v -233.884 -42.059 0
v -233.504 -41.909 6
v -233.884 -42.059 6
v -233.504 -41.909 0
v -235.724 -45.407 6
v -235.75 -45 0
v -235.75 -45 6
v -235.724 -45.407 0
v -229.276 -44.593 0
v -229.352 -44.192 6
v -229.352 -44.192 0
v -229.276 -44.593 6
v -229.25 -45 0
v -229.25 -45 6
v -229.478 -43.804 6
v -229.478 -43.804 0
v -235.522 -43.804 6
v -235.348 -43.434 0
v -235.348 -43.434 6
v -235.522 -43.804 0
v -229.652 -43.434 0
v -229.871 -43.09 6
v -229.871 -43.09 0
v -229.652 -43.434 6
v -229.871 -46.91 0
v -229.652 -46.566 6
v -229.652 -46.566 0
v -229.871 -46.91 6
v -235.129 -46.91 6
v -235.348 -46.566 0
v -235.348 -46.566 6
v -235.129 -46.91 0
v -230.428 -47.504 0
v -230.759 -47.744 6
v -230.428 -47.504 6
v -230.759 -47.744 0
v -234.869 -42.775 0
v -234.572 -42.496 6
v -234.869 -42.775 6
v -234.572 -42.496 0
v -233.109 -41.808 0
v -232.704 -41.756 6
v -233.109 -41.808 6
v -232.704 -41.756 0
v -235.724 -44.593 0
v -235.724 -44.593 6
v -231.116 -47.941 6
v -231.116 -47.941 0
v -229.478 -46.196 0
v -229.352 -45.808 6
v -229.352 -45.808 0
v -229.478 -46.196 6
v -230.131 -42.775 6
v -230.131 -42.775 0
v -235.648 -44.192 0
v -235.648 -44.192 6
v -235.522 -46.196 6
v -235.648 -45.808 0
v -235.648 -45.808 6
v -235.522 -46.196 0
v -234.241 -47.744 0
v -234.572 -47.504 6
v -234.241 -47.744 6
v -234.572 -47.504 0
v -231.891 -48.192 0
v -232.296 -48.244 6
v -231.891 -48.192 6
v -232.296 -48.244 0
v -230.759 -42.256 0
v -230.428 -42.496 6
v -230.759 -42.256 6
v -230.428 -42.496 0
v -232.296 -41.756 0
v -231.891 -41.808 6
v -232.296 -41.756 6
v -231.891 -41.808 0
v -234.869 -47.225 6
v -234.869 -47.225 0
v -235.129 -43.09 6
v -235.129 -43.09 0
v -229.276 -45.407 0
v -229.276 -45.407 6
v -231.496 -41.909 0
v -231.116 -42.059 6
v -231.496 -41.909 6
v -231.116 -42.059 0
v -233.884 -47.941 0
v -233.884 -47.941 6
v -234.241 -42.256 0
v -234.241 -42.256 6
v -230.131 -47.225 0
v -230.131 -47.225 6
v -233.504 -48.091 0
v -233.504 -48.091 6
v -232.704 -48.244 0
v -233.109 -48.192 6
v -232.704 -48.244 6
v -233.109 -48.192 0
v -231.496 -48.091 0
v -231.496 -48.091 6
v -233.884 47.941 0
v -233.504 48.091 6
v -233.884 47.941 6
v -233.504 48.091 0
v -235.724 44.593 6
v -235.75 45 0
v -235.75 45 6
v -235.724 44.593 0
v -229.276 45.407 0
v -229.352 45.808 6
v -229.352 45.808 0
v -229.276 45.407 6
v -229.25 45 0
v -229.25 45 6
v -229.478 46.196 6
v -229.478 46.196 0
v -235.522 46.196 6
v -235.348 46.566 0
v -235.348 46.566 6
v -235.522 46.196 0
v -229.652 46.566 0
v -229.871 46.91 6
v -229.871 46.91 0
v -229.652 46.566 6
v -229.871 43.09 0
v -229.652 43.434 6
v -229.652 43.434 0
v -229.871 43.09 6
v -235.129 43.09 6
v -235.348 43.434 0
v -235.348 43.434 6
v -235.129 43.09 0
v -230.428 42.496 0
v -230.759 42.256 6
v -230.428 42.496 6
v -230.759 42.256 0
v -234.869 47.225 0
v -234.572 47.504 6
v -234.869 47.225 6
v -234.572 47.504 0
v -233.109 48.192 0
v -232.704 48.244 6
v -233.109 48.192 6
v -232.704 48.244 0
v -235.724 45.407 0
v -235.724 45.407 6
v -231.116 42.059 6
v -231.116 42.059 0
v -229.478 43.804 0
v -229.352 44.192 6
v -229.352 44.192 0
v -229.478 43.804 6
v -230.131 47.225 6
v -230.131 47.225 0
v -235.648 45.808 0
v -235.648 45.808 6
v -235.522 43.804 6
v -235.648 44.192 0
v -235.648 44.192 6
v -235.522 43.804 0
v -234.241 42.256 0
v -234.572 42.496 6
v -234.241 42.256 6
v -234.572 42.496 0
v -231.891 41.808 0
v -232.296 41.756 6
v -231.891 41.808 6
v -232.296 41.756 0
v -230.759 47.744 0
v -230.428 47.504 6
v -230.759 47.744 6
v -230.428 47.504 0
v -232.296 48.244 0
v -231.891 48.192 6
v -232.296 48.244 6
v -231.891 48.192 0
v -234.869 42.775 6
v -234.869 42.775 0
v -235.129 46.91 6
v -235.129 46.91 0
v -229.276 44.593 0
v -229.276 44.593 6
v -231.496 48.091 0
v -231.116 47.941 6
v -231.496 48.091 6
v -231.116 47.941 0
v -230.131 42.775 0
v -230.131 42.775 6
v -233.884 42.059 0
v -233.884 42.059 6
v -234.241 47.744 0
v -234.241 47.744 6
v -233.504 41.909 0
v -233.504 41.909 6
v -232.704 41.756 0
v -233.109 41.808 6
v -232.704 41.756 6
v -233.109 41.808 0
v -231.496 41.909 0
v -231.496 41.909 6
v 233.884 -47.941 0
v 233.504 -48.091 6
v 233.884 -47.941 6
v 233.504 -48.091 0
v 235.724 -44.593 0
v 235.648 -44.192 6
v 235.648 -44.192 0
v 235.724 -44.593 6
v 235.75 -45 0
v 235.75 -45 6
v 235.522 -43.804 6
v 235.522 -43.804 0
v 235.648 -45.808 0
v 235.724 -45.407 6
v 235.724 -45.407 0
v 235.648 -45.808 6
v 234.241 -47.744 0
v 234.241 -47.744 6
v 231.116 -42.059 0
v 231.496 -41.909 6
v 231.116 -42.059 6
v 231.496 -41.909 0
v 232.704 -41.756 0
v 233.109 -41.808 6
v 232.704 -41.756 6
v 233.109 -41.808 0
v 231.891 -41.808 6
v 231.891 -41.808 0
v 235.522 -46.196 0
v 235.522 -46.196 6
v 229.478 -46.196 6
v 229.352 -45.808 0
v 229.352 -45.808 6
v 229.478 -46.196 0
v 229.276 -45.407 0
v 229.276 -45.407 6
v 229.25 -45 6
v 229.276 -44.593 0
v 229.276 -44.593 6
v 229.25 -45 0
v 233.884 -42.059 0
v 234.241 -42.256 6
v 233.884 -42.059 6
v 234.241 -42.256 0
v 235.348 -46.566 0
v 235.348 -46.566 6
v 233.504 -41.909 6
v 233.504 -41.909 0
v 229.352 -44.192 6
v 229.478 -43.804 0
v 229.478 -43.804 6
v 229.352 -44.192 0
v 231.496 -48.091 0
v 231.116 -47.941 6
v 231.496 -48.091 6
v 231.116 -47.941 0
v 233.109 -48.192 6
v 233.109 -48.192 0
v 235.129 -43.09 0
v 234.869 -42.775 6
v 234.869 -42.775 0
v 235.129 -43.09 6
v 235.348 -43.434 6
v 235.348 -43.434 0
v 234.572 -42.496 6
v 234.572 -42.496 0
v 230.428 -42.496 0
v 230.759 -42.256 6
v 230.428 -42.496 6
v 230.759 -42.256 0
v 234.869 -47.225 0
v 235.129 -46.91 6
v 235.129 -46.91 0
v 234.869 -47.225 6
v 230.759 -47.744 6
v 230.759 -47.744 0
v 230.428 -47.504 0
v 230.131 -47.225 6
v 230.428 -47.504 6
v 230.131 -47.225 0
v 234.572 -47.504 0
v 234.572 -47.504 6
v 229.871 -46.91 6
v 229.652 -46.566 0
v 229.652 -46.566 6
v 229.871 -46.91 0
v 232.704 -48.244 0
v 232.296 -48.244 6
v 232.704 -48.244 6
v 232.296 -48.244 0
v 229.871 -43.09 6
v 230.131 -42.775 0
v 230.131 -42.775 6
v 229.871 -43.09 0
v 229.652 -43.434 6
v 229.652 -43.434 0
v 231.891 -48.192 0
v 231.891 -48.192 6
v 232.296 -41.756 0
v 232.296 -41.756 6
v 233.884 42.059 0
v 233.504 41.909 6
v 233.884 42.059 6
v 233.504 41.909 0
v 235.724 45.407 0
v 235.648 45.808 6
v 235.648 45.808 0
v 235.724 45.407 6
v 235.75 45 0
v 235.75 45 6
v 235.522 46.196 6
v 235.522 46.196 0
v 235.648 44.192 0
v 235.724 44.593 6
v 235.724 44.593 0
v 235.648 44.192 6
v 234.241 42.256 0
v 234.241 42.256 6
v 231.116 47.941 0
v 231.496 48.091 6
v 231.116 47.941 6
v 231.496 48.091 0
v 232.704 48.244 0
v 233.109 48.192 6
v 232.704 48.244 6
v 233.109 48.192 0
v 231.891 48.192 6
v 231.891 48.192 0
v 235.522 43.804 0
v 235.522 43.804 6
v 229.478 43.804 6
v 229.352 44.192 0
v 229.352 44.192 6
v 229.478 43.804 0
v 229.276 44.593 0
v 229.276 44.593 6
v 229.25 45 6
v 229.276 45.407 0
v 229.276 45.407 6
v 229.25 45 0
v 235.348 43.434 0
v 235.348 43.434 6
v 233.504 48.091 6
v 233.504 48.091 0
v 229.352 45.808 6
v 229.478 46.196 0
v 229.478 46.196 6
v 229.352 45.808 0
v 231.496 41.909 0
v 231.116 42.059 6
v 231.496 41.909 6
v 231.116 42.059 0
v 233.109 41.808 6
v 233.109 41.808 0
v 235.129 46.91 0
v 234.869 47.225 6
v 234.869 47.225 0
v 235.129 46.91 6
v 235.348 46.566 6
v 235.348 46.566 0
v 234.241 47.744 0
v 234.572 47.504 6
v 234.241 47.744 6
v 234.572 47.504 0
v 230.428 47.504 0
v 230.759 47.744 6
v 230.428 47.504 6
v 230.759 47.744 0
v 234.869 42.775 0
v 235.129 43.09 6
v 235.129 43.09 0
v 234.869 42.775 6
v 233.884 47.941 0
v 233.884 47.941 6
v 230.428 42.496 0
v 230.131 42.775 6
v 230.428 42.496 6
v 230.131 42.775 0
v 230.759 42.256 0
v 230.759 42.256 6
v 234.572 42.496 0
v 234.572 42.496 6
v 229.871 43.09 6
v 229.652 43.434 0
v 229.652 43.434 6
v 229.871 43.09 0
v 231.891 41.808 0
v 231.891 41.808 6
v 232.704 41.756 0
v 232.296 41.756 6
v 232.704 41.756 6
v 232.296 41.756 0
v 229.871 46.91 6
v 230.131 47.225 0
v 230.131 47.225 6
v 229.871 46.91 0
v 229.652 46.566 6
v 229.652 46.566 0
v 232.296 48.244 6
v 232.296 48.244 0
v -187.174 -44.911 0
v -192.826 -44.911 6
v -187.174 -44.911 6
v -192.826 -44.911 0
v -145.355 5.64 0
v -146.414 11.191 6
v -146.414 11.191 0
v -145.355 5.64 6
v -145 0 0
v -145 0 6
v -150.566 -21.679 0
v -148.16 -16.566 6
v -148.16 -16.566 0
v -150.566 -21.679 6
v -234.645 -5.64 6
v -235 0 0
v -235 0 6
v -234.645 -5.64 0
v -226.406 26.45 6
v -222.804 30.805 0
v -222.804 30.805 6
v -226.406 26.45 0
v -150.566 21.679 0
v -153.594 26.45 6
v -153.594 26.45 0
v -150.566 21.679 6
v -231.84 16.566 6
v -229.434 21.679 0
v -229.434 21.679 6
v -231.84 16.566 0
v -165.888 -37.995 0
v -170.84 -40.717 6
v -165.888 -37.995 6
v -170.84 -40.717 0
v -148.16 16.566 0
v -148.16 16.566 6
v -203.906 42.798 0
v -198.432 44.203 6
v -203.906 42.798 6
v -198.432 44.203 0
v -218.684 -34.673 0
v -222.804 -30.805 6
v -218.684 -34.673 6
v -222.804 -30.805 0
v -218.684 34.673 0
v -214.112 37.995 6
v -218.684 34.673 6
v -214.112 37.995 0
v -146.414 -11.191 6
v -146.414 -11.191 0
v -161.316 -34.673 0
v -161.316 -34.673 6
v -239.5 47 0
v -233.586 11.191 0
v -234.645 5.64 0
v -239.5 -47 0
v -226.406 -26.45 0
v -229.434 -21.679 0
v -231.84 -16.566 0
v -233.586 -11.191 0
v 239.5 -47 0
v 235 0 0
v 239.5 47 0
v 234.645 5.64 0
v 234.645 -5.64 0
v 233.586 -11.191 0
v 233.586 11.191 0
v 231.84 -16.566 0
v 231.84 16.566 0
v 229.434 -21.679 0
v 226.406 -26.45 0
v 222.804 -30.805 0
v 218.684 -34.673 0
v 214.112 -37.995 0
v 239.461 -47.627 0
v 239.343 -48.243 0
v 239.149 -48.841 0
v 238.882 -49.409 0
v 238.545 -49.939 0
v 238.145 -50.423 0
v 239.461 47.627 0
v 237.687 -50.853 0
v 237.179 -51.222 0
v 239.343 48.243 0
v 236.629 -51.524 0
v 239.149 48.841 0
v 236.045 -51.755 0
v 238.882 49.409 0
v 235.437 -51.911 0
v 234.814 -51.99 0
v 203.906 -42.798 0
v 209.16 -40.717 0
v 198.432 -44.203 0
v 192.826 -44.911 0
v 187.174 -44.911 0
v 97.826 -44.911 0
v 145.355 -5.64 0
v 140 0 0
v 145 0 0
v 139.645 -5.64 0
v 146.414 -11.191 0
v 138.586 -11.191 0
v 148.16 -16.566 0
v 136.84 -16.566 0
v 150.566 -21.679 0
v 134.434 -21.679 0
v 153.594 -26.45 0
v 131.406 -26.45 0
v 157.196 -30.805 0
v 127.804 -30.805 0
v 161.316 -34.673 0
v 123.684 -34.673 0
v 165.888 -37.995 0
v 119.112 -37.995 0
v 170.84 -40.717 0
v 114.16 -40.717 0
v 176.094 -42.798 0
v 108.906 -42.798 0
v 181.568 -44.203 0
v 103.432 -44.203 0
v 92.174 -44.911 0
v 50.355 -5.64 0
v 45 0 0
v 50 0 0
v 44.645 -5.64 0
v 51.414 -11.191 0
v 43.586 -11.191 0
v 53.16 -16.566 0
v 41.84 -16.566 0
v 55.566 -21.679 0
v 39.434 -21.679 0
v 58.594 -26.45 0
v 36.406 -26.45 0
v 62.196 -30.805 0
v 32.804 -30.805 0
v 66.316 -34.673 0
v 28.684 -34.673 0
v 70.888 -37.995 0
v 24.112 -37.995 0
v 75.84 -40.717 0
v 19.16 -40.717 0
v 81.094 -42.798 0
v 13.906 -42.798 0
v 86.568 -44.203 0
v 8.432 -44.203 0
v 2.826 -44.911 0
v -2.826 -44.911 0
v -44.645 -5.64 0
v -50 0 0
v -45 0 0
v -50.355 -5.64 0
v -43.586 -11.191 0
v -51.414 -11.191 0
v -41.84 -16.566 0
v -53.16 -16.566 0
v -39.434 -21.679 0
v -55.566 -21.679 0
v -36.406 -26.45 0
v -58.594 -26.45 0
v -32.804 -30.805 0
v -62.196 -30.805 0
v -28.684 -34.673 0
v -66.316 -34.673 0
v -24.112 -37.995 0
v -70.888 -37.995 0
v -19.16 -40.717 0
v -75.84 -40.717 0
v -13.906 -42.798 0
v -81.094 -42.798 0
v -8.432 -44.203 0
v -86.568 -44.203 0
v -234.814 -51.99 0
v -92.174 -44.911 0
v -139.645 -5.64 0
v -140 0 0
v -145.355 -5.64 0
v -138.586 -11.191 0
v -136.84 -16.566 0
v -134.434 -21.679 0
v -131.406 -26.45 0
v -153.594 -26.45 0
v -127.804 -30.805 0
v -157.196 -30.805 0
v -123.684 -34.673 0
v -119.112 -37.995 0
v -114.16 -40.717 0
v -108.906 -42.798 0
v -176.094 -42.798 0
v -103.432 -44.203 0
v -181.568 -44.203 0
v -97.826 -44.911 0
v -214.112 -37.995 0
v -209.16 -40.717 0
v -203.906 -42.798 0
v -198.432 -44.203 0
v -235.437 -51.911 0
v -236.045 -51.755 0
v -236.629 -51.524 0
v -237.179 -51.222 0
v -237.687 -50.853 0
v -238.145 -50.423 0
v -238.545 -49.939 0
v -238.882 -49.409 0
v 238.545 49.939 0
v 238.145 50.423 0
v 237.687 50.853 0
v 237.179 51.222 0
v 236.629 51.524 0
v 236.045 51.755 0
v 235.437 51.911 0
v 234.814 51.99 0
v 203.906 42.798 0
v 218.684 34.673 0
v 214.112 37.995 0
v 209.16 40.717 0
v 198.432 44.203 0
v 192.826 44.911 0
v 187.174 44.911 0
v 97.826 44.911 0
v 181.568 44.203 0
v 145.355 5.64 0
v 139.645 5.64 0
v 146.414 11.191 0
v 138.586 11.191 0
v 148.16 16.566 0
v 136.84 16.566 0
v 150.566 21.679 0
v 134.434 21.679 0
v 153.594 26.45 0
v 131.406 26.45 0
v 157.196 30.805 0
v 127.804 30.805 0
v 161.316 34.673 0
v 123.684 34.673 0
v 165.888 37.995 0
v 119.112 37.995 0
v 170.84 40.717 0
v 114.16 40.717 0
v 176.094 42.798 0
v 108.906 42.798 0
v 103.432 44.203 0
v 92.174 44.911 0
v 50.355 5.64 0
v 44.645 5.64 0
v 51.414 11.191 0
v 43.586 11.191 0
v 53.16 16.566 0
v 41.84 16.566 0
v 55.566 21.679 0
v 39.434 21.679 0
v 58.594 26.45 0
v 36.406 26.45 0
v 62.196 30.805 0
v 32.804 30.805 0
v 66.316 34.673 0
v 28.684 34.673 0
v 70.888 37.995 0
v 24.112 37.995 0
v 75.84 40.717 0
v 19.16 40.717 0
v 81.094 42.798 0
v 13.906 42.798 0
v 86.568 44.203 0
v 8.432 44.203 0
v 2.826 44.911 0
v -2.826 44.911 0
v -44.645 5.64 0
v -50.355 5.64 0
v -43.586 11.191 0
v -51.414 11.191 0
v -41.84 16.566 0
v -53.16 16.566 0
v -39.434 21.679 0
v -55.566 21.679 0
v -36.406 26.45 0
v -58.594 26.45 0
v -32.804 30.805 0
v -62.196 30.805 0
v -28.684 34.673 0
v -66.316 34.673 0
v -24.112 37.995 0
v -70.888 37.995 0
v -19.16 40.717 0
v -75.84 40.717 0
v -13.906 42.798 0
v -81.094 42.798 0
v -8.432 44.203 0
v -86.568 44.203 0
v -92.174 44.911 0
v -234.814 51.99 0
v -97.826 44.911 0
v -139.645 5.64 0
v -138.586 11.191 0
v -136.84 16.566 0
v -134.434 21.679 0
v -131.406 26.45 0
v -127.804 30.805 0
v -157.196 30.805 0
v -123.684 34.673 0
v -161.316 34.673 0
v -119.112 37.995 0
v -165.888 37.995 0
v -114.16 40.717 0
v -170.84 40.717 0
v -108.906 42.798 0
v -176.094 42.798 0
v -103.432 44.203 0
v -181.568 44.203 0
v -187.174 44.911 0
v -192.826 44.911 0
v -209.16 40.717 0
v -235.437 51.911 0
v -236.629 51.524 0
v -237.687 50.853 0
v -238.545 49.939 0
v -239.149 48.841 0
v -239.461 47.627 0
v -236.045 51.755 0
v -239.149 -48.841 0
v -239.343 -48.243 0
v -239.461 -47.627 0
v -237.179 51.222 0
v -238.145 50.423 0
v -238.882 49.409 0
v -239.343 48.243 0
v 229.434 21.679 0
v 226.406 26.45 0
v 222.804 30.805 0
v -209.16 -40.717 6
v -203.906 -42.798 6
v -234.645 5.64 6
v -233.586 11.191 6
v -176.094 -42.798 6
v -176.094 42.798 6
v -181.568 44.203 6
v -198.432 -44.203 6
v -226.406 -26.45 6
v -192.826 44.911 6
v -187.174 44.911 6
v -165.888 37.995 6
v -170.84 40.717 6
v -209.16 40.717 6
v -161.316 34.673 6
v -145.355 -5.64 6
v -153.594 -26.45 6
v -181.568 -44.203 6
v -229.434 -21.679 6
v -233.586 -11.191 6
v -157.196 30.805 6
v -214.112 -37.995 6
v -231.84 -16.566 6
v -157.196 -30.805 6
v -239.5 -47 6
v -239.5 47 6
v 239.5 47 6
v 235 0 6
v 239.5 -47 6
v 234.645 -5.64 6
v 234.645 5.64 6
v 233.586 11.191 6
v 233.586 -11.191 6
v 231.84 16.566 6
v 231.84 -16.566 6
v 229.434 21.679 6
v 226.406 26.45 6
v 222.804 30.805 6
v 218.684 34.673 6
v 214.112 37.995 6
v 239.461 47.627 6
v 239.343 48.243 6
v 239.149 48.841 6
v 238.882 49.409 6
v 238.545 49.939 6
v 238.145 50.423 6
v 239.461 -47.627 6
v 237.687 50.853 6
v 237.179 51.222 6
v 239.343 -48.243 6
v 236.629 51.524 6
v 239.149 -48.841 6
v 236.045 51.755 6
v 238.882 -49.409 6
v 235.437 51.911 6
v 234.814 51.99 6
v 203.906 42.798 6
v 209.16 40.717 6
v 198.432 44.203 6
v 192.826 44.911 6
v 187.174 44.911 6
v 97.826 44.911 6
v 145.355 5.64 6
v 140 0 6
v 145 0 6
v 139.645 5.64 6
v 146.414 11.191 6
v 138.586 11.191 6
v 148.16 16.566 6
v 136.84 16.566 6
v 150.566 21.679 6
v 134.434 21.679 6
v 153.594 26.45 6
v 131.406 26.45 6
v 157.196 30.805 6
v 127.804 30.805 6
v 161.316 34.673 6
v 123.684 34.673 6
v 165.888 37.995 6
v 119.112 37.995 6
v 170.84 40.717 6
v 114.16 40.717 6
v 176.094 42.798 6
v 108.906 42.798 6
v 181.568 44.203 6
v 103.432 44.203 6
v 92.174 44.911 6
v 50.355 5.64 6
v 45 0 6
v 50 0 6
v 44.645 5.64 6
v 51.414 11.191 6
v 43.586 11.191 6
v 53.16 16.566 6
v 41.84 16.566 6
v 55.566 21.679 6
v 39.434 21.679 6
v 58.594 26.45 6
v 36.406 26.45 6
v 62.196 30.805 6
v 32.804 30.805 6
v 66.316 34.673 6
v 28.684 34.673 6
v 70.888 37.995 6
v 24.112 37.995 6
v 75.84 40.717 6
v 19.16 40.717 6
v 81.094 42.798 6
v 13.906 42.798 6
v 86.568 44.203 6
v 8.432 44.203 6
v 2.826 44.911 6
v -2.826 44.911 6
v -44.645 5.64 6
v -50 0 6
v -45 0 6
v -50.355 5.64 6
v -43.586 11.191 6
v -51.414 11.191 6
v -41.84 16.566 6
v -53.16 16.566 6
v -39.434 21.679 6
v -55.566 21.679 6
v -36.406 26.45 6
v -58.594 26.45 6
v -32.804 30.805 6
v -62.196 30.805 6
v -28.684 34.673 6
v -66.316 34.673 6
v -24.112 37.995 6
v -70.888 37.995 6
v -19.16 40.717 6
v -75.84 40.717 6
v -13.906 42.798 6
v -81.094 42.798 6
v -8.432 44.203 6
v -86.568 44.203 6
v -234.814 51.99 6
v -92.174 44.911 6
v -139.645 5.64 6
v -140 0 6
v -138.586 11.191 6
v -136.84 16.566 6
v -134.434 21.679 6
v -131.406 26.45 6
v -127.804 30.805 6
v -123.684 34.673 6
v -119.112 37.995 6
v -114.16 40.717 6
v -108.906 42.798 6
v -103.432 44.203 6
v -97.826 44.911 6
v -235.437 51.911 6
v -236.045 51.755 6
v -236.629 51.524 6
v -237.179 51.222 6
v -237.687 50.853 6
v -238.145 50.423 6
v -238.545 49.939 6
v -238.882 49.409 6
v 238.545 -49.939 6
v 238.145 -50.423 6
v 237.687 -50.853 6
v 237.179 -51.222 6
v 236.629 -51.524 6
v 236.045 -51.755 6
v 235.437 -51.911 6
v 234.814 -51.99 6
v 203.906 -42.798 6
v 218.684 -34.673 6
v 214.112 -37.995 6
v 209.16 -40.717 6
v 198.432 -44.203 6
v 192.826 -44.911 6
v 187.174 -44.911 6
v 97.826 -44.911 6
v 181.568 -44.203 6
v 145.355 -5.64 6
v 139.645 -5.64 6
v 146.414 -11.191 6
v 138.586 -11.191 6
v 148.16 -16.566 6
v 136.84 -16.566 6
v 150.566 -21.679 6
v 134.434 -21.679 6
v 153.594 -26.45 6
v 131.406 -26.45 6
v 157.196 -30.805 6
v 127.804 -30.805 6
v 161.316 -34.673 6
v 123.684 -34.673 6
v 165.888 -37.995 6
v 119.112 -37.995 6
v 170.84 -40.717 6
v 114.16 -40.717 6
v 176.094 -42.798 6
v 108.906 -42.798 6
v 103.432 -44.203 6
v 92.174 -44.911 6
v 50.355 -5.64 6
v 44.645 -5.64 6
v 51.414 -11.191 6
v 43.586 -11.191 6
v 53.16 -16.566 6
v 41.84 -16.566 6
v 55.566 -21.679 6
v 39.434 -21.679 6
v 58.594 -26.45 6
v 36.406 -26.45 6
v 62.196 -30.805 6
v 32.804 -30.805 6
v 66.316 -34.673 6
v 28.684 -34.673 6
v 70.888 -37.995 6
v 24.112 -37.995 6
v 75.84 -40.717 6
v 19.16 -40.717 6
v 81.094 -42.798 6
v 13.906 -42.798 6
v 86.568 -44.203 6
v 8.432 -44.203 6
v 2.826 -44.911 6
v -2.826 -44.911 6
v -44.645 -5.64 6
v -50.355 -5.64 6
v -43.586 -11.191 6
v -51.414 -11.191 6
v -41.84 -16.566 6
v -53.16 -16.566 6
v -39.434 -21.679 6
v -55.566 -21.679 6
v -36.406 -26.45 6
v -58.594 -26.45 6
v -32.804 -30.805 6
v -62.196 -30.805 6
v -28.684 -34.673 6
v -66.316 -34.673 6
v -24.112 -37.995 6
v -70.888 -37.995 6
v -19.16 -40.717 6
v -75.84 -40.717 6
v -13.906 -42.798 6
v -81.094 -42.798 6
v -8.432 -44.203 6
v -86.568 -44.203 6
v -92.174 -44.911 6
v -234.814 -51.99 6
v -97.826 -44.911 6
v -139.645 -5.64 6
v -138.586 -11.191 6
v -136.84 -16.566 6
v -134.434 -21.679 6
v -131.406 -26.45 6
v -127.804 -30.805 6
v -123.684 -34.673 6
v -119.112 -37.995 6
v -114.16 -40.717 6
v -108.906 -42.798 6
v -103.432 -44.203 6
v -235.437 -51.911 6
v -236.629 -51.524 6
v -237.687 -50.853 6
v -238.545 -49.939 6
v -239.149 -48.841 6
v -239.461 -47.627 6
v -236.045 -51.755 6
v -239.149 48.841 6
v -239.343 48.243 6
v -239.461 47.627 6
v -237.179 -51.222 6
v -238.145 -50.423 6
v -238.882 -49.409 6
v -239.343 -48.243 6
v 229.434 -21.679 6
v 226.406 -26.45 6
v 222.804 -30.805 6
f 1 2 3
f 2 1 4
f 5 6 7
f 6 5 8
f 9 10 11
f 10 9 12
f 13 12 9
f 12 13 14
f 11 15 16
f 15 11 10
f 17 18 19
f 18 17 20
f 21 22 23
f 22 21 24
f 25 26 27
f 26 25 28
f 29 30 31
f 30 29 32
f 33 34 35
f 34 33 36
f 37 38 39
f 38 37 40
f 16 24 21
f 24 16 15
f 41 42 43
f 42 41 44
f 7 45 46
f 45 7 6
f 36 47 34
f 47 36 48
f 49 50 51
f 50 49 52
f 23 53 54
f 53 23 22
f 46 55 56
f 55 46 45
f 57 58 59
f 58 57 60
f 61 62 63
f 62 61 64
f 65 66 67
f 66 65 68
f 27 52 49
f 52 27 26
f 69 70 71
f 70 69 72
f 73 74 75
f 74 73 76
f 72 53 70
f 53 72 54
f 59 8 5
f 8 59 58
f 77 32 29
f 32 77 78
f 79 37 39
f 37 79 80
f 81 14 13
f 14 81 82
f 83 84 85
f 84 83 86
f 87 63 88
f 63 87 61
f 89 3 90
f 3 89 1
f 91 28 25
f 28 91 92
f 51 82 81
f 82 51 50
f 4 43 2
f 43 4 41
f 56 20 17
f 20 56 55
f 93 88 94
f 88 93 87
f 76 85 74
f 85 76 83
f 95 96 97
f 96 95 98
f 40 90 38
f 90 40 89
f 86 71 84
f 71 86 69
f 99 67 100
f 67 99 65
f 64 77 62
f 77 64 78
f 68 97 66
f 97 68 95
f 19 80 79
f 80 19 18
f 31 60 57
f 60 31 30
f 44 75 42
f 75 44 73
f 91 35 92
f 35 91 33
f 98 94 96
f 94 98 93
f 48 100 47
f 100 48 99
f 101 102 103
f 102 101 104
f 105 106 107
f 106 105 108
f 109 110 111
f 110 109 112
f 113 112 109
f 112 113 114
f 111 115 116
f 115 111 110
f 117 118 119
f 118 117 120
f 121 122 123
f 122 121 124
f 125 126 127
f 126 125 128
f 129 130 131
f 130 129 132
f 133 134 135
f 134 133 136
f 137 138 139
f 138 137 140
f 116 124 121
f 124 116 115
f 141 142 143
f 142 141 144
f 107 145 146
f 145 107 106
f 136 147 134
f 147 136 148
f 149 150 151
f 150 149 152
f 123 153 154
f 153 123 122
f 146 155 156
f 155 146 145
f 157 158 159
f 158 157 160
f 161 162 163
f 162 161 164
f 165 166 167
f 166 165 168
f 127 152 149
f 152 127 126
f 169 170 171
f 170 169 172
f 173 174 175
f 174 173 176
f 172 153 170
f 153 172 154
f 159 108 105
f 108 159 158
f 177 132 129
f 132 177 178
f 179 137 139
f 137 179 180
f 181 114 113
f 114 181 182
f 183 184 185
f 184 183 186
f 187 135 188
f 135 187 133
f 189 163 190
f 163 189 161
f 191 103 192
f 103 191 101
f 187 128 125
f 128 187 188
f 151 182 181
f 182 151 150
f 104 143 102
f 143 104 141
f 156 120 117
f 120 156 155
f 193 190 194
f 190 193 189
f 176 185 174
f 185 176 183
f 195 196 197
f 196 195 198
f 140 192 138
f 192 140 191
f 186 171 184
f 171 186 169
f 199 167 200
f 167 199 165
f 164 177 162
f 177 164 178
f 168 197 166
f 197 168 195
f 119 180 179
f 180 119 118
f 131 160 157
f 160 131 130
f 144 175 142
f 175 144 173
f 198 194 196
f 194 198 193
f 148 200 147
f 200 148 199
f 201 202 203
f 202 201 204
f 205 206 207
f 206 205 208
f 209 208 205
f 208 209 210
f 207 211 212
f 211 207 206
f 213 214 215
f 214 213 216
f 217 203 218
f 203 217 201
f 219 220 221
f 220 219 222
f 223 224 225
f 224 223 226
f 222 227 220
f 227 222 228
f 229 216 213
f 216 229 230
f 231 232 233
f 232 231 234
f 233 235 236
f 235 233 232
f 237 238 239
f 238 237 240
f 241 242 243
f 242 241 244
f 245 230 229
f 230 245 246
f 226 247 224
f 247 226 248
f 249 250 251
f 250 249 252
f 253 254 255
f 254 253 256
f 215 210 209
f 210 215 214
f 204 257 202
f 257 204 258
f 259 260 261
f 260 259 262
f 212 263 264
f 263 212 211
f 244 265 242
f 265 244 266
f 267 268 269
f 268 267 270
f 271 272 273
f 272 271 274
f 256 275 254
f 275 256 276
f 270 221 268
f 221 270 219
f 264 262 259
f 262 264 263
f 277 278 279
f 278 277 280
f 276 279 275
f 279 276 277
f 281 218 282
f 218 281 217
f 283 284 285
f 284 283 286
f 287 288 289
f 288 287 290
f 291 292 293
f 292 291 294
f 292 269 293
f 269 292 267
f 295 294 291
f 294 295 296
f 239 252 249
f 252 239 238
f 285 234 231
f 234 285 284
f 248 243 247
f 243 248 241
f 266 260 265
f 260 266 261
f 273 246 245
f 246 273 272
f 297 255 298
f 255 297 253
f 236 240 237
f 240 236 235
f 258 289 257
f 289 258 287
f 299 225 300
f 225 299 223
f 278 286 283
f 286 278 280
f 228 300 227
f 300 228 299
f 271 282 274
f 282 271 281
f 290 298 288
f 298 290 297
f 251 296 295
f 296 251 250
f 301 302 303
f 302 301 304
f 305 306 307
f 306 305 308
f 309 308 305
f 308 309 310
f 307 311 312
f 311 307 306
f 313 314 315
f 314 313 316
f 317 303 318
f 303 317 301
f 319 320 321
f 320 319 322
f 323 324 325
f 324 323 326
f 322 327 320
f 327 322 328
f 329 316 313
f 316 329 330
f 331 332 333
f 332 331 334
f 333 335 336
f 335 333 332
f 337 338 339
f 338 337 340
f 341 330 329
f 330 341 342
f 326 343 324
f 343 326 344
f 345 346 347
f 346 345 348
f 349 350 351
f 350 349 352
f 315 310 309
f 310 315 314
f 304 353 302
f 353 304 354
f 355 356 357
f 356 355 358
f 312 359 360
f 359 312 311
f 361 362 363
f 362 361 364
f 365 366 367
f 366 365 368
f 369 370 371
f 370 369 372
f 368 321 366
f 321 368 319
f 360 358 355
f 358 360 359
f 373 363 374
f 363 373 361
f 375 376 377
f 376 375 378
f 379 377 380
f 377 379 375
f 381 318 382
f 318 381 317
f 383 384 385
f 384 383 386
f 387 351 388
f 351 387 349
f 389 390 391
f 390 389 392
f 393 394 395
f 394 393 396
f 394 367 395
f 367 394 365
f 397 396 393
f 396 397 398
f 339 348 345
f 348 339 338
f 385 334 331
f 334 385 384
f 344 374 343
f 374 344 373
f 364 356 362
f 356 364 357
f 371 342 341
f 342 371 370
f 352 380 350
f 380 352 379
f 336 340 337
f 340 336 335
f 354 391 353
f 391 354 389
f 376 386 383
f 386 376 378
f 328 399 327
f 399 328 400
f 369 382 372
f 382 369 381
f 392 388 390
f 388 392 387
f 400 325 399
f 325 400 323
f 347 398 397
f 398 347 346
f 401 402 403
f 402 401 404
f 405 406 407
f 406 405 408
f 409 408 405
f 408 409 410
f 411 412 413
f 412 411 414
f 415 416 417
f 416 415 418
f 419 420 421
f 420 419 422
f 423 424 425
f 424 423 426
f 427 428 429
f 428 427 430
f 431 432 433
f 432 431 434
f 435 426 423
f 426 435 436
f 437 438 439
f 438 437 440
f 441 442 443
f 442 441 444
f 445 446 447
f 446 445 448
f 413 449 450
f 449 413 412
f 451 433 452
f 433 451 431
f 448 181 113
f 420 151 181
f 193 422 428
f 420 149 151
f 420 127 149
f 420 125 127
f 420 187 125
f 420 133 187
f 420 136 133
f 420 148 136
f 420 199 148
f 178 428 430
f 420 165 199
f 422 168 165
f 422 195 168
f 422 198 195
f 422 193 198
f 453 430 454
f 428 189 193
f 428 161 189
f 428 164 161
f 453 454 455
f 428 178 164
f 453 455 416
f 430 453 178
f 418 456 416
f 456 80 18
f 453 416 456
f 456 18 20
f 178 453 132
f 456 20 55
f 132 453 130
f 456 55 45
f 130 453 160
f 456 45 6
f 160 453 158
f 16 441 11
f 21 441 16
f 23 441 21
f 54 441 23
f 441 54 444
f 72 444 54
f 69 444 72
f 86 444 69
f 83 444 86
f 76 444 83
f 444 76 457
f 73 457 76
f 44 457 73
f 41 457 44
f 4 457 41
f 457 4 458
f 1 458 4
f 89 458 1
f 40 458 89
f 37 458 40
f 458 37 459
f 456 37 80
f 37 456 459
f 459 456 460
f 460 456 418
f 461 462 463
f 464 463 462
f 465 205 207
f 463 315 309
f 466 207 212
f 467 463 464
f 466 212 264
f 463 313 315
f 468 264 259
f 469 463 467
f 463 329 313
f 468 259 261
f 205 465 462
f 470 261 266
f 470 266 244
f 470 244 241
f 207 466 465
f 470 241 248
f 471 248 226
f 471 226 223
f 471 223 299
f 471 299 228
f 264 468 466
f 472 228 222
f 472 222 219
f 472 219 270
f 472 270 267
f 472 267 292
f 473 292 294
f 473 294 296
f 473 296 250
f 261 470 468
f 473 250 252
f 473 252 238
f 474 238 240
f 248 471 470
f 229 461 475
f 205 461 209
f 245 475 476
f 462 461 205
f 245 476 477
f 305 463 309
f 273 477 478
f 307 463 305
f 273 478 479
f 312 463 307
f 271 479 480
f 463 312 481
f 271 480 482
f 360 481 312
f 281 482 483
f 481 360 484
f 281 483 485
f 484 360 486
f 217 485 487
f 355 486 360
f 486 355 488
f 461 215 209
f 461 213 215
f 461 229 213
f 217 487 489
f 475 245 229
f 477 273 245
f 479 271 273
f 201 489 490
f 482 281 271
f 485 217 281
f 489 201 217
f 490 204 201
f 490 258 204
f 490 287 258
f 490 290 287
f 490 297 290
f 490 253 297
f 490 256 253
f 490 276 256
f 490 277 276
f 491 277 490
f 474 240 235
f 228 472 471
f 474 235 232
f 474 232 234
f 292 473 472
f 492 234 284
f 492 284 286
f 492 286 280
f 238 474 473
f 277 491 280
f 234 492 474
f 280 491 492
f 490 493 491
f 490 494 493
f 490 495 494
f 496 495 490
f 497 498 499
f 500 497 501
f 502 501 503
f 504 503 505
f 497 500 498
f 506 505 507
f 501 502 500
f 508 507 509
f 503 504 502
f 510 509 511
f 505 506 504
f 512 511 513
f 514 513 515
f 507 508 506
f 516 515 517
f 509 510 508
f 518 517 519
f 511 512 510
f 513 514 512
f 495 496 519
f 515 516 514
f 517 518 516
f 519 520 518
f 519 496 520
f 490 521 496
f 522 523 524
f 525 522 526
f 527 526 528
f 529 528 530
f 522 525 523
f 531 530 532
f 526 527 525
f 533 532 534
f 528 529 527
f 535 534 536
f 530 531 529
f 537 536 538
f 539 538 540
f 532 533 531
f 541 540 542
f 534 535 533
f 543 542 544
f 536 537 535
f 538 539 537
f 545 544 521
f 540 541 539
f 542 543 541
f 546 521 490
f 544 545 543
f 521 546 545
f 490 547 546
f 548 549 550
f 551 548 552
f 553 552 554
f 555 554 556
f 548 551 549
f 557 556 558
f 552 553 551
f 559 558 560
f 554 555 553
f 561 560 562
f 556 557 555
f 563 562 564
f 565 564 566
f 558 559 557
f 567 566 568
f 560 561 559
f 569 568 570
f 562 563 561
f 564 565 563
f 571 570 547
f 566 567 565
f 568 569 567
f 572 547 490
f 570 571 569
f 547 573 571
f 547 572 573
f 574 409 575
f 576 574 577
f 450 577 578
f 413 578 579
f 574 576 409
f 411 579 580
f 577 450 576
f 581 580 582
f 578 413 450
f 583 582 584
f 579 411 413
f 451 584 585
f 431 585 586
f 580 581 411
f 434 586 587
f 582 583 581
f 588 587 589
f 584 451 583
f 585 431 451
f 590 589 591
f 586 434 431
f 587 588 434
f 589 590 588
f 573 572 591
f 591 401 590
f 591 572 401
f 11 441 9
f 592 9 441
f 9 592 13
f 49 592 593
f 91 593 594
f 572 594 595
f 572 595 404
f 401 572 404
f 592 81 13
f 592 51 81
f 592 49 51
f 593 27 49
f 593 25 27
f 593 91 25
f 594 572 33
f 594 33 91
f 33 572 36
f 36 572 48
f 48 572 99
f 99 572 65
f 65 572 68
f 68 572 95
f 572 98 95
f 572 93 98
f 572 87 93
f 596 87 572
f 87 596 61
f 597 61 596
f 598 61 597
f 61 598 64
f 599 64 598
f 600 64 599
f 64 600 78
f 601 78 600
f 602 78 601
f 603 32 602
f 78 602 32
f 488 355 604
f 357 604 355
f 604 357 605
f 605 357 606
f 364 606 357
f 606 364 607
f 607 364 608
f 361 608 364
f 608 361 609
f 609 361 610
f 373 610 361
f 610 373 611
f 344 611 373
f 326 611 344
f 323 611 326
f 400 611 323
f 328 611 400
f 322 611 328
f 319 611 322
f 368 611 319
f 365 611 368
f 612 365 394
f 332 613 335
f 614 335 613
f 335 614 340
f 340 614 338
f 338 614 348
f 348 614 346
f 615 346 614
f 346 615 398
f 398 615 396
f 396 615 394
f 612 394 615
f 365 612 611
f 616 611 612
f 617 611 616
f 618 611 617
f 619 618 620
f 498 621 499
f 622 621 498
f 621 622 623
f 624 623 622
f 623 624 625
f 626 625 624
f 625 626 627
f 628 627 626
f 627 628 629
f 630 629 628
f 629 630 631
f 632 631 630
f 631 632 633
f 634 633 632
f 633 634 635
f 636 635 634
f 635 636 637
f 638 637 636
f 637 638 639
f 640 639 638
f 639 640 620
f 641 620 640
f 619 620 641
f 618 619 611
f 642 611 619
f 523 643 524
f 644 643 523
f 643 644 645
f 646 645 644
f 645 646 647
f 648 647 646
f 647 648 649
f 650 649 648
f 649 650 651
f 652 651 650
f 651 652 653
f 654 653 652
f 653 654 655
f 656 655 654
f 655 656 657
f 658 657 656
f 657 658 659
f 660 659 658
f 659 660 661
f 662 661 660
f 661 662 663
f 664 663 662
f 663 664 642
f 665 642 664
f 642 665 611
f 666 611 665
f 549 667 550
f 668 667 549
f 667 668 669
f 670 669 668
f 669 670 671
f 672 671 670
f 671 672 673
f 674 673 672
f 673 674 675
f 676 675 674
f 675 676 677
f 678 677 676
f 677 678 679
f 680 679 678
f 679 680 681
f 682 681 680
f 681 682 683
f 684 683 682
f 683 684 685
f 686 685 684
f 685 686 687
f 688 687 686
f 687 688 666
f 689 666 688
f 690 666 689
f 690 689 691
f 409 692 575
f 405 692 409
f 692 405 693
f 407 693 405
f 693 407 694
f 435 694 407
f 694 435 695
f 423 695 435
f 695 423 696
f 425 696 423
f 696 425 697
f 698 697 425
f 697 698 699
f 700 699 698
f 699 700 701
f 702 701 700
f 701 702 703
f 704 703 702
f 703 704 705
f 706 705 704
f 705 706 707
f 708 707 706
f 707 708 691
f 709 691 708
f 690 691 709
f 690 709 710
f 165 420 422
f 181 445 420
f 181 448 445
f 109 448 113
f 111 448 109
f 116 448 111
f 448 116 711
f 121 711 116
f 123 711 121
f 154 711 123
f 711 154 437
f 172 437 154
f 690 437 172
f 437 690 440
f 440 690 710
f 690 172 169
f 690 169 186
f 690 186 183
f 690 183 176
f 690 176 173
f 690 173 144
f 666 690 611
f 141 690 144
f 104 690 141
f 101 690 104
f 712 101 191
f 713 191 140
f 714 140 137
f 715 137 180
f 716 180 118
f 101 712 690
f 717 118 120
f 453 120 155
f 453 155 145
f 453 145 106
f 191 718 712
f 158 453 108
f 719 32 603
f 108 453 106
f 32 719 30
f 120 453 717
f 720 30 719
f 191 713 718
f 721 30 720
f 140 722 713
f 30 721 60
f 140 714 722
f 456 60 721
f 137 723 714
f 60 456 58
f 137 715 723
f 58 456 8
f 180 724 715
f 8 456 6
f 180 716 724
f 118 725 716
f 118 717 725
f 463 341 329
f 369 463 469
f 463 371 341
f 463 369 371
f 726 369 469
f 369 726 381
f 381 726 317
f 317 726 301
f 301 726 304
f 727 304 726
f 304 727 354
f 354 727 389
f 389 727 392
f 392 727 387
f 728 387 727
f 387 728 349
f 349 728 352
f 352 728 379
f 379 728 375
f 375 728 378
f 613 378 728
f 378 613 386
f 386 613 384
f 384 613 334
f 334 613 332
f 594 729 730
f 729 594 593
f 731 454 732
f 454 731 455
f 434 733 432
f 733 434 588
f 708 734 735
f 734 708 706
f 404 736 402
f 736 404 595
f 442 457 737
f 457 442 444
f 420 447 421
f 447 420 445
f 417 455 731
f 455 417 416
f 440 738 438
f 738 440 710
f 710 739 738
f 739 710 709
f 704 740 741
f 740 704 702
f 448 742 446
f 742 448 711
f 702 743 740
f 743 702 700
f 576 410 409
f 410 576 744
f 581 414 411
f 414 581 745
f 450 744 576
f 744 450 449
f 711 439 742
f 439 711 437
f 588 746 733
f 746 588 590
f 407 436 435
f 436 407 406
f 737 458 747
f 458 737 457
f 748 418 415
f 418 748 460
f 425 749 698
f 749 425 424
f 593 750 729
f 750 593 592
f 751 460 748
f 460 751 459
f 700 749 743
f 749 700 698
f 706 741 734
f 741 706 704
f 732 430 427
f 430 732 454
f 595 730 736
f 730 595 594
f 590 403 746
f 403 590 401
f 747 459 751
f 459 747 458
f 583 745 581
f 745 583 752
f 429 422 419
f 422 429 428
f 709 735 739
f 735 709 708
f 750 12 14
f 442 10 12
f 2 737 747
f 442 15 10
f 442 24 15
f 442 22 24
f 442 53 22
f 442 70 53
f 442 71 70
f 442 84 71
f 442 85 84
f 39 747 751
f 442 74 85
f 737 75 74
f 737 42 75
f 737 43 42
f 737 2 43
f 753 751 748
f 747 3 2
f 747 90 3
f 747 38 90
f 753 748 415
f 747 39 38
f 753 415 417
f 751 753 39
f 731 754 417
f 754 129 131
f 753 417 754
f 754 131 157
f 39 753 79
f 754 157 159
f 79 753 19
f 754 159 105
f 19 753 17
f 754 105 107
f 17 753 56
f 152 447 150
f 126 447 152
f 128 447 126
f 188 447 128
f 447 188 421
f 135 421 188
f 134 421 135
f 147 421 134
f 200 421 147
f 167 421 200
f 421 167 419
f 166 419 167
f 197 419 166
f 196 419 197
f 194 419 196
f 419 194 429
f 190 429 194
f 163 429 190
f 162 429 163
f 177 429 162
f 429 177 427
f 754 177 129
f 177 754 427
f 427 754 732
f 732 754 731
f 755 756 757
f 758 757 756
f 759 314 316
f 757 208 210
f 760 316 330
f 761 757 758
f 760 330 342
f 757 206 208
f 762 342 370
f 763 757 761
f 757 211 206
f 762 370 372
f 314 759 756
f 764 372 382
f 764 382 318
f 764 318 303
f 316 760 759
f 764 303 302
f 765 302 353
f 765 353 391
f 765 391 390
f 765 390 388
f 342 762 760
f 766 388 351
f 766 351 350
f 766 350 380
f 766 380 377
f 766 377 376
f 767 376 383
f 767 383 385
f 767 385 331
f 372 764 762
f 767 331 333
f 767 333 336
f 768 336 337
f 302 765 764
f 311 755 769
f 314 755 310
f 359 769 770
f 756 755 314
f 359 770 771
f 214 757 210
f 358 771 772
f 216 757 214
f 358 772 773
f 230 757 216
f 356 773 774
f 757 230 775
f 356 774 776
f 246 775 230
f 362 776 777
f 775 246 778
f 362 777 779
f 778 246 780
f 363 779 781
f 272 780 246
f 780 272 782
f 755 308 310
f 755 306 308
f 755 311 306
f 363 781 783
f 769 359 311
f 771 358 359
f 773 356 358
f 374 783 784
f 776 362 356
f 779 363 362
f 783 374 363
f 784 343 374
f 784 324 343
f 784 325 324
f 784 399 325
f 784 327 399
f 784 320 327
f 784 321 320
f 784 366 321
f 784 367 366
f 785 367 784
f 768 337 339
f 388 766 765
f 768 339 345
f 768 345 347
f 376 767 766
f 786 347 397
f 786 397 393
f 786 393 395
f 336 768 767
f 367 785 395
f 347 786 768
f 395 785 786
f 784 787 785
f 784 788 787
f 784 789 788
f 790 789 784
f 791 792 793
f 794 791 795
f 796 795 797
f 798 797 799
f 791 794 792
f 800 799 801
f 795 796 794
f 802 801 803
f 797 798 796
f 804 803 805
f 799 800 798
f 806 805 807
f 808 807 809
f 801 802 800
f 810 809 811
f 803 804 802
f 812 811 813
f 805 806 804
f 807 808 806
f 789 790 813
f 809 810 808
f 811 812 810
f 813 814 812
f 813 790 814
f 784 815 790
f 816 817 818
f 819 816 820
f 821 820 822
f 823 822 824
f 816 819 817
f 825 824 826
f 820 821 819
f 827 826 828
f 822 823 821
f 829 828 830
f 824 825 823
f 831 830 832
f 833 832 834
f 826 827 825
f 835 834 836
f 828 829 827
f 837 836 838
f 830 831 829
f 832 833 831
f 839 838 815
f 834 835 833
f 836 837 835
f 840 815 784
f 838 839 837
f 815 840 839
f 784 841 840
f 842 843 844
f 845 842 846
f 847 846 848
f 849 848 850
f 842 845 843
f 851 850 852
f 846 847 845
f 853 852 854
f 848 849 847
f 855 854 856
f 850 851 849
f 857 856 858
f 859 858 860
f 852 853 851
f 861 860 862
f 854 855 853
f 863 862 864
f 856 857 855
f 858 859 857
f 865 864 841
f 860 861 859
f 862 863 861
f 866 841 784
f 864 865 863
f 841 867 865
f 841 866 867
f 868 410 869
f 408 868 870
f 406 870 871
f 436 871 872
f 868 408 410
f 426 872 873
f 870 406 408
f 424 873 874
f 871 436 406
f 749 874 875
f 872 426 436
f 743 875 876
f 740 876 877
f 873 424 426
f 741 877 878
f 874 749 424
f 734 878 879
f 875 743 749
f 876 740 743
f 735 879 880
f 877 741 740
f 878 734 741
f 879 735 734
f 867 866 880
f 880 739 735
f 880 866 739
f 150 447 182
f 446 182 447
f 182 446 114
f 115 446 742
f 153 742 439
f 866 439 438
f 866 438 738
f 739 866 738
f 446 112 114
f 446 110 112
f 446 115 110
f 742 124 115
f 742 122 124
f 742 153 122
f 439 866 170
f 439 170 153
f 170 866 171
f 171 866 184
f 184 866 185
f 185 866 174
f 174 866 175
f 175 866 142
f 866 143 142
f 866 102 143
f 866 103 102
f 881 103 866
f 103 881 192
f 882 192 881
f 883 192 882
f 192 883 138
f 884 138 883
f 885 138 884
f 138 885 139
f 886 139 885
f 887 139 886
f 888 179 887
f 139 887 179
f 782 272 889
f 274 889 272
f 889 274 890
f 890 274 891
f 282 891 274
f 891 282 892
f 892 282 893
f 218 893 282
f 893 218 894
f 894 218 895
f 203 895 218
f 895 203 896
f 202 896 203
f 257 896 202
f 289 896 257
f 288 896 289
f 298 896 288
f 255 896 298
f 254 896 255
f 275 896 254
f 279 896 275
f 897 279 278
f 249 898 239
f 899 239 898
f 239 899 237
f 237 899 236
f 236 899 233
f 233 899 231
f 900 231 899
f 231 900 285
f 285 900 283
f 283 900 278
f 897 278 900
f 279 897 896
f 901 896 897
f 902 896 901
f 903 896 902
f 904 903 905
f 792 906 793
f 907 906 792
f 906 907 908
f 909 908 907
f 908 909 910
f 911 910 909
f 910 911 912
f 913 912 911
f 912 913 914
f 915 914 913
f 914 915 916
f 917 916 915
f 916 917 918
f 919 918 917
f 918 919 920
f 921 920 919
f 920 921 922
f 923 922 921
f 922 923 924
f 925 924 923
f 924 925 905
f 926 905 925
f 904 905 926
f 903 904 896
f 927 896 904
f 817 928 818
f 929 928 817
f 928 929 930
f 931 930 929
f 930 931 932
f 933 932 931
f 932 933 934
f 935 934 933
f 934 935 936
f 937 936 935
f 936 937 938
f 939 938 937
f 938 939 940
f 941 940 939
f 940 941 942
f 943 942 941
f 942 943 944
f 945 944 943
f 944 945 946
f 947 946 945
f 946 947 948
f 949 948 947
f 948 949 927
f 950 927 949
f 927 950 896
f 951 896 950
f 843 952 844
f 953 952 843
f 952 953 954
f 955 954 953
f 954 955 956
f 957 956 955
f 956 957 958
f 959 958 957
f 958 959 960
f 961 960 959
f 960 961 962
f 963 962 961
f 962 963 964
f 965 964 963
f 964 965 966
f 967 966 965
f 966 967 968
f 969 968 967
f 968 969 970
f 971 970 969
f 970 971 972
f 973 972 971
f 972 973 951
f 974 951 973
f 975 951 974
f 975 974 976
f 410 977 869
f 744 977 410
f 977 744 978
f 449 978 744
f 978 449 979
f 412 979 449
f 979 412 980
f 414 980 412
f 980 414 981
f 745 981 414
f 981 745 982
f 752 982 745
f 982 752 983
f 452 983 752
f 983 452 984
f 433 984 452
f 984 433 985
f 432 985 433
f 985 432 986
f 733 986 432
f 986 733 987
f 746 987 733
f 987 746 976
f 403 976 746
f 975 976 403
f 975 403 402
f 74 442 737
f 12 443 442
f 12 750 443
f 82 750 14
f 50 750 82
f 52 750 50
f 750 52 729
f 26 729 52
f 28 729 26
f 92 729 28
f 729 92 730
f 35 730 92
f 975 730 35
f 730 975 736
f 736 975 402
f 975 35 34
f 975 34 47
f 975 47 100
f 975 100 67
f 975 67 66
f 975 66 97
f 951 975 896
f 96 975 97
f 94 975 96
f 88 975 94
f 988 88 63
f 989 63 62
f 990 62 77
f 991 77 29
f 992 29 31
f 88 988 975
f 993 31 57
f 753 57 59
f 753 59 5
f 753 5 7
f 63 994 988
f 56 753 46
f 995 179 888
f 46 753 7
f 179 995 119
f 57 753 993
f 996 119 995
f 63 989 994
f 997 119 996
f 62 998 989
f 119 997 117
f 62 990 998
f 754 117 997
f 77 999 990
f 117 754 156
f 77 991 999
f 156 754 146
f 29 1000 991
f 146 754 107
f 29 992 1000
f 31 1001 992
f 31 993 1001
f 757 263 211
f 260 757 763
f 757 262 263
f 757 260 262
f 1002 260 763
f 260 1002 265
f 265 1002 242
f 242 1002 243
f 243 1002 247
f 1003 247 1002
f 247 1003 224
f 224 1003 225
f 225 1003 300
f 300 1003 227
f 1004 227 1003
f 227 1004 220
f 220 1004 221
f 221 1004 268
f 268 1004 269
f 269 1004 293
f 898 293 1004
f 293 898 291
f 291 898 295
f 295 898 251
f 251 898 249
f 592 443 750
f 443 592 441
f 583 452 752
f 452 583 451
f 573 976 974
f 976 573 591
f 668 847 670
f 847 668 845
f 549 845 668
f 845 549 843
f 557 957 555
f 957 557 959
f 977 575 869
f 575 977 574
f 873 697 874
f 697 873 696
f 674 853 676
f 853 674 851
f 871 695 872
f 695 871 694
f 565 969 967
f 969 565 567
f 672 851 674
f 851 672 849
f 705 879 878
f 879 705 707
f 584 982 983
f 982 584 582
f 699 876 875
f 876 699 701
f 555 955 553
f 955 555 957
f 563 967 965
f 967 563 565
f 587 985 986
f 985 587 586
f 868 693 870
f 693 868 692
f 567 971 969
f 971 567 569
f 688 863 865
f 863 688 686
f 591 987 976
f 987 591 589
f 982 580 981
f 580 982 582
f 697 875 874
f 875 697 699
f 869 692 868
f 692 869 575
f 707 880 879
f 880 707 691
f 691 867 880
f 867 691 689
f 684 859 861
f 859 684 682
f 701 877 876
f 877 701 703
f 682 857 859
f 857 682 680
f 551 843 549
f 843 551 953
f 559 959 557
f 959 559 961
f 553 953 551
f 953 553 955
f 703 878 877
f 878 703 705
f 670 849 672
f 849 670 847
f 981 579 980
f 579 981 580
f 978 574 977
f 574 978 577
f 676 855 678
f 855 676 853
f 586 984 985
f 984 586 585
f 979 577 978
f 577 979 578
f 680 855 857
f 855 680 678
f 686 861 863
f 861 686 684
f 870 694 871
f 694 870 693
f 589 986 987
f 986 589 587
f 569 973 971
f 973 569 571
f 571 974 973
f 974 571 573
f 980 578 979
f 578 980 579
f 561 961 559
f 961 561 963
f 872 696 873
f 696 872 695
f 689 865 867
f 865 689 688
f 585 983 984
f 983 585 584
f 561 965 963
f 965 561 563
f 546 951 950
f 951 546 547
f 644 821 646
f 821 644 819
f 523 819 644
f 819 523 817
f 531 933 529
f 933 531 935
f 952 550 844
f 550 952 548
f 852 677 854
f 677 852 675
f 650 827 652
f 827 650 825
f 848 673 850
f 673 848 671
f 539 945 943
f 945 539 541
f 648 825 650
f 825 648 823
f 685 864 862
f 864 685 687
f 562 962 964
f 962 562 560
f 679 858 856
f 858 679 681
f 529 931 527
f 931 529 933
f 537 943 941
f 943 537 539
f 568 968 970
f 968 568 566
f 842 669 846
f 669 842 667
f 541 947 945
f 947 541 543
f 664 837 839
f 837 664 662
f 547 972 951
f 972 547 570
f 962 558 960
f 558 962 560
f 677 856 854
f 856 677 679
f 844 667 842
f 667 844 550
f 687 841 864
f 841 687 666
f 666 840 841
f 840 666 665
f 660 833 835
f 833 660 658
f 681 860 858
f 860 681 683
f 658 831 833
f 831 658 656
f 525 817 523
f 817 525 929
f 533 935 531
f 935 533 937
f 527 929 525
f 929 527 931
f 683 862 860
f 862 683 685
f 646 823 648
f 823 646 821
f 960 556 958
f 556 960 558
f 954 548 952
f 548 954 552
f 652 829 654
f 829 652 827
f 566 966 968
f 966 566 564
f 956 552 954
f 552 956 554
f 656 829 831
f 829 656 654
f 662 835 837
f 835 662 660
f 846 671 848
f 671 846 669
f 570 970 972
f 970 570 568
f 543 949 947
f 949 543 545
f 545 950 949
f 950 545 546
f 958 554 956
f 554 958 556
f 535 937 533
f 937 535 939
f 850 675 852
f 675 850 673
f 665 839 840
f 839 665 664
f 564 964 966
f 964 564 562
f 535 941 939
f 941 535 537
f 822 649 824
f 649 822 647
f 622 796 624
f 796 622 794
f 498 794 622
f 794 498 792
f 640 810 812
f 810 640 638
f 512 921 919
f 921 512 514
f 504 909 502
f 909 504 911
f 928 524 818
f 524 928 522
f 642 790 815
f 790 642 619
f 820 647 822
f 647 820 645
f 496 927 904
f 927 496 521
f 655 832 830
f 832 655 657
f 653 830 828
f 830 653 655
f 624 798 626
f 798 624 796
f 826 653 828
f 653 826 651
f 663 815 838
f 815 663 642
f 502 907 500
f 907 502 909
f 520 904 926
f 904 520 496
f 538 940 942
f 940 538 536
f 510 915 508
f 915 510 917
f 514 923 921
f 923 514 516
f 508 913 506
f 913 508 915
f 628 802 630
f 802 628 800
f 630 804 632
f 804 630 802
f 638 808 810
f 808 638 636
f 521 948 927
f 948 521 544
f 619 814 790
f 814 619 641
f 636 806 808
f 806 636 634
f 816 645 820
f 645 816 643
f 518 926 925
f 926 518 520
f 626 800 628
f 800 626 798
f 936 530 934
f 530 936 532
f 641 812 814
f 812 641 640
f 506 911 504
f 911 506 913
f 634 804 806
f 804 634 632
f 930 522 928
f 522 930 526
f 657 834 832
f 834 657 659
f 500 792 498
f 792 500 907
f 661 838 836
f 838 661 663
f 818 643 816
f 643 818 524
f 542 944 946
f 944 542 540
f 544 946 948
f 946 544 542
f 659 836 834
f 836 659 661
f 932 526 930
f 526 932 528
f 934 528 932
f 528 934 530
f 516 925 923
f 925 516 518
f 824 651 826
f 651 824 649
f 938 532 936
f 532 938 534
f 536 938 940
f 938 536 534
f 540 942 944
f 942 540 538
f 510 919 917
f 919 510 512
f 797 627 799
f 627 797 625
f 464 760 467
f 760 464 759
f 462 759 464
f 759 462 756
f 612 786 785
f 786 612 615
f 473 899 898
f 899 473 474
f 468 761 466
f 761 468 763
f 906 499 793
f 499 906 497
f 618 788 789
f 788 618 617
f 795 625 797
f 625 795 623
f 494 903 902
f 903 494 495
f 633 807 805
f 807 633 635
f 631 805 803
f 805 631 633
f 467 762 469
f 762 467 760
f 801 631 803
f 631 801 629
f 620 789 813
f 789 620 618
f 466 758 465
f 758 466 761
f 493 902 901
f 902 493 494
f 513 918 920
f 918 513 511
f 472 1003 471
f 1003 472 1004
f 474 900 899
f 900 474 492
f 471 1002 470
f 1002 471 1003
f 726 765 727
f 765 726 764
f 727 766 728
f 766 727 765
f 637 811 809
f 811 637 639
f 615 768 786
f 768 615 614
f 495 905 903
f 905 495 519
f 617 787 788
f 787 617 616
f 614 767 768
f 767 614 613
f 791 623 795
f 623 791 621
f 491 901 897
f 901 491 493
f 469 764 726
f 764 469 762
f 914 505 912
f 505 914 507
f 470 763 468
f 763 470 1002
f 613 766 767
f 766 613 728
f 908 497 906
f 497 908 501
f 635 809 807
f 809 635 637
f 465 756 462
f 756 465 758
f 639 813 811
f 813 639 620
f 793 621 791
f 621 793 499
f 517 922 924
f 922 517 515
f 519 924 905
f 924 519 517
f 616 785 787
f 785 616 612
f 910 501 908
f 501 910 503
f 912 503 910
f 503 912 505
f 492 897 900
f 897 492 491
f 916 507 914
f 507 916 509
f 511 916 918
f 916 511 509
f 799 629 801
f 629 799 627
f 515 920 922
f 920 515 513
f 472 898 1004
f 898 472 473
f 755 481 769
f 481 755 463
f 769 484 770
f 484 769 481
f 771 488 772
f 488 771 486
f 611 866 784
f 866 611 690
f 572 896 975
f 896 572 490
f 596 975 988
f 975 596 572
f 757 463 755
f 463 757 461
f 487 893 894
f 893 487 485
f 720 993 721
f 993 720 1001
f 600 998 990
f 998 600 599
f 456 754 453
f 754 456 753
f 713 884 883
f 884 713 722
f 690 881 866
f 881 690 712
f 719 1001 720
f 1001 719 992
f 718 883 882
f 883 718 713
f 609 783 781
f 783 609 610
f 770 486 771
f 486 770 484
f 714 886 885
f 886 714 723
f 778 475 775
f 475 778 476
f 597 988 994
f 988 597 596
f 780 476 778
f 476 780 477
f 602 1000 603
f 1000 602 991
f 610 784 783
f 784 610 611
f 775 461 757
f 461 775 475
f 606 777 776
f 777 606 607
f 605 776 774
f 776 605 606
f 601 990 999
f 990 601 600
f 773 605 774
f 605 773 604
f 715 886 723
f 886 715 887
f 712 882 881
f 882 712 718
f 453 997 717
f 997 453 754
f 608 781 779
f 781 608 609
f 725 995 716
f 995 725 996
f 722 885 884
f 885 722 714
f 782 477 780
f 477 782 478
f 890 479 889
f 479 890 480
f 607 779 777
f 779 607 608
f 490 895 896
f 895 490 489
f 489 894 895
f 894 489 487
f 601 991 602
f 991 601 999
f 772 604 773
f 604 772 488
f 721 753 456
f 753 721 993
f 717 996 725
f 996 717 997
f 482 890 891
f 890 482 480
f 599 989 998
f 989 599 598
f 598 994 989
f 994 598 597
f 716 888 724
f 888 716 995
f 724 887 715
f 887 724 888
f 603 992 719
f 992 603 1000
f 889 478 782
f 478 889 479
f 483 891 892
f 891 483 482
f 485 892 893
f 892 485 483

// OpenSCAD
$fn = 50;

difference() {
	union() {
		hull() {
			translate(v = [-234.5, 47.0, 0]) {
				cylinder(h = 6, r = 5);
			}
			translate(v = [234.5, 47.0, 0]) {
				cylinder(h = 6, r = 5);
			}
			translate(v = [-234.5, -47.0, 0]) {
				cylinder(h = 6, r = 5);
			}
			translate(v = [234.5, -47.0, 0]) {
				cylinder(h = 6, r = 5);
			}
		}
	}
	union() {
		translate(v = [-232.5, -45.0, -100.0]) {
			cylinder(h = 200, r = 3.25);
		}
		translate(v = [-232.5, 45.0, -100.0]) {
			cylinder(h = 200, r = 3.25);
		}
		translate(v = [232.5, -45.0, -100.0]) {
			cylinder(h = 200, r = 3.25);
		}
		translate(v = [232.5, 45.0, -100.0]) {
			cylinder(h = 200, r = 3.25);
		}
		translate(v = [-232.5, -45.0, -100.0]) {
			cylinder(h = 200, r = 1.8);
		}
		translate(v = [-232.5, 45.0, -100.0]) {
			cylinder(h = 200, r = 1.8);
		}
		translate(v = [232.5, -45.0, -100.0]) {
			cylinder(h = 200, r = 1.8);
		}
		translate(v = [232.5, 45.0, -100.0]) {
			cylinder(h = 200, r = 1.8);
		}
		translate(v = [-190.0, 0, 0.0]) {
			cylinder(h = 6, r = 45.0);
		}
		translate(v = [-95.0, 0, 0.0]) {
			cylinder(h = 6, r = 45.0);
		}
		cylinder(h = 6, r = 45.0);
		translate(v = [95.0, 0, 0.0]) {
			cylinder(h = 6, r = 45.0);
		}
		translate(v = [190.0, 0, 0.0]) {
			cylinder(h = 6, r = 45.0);
		}
	}
}
